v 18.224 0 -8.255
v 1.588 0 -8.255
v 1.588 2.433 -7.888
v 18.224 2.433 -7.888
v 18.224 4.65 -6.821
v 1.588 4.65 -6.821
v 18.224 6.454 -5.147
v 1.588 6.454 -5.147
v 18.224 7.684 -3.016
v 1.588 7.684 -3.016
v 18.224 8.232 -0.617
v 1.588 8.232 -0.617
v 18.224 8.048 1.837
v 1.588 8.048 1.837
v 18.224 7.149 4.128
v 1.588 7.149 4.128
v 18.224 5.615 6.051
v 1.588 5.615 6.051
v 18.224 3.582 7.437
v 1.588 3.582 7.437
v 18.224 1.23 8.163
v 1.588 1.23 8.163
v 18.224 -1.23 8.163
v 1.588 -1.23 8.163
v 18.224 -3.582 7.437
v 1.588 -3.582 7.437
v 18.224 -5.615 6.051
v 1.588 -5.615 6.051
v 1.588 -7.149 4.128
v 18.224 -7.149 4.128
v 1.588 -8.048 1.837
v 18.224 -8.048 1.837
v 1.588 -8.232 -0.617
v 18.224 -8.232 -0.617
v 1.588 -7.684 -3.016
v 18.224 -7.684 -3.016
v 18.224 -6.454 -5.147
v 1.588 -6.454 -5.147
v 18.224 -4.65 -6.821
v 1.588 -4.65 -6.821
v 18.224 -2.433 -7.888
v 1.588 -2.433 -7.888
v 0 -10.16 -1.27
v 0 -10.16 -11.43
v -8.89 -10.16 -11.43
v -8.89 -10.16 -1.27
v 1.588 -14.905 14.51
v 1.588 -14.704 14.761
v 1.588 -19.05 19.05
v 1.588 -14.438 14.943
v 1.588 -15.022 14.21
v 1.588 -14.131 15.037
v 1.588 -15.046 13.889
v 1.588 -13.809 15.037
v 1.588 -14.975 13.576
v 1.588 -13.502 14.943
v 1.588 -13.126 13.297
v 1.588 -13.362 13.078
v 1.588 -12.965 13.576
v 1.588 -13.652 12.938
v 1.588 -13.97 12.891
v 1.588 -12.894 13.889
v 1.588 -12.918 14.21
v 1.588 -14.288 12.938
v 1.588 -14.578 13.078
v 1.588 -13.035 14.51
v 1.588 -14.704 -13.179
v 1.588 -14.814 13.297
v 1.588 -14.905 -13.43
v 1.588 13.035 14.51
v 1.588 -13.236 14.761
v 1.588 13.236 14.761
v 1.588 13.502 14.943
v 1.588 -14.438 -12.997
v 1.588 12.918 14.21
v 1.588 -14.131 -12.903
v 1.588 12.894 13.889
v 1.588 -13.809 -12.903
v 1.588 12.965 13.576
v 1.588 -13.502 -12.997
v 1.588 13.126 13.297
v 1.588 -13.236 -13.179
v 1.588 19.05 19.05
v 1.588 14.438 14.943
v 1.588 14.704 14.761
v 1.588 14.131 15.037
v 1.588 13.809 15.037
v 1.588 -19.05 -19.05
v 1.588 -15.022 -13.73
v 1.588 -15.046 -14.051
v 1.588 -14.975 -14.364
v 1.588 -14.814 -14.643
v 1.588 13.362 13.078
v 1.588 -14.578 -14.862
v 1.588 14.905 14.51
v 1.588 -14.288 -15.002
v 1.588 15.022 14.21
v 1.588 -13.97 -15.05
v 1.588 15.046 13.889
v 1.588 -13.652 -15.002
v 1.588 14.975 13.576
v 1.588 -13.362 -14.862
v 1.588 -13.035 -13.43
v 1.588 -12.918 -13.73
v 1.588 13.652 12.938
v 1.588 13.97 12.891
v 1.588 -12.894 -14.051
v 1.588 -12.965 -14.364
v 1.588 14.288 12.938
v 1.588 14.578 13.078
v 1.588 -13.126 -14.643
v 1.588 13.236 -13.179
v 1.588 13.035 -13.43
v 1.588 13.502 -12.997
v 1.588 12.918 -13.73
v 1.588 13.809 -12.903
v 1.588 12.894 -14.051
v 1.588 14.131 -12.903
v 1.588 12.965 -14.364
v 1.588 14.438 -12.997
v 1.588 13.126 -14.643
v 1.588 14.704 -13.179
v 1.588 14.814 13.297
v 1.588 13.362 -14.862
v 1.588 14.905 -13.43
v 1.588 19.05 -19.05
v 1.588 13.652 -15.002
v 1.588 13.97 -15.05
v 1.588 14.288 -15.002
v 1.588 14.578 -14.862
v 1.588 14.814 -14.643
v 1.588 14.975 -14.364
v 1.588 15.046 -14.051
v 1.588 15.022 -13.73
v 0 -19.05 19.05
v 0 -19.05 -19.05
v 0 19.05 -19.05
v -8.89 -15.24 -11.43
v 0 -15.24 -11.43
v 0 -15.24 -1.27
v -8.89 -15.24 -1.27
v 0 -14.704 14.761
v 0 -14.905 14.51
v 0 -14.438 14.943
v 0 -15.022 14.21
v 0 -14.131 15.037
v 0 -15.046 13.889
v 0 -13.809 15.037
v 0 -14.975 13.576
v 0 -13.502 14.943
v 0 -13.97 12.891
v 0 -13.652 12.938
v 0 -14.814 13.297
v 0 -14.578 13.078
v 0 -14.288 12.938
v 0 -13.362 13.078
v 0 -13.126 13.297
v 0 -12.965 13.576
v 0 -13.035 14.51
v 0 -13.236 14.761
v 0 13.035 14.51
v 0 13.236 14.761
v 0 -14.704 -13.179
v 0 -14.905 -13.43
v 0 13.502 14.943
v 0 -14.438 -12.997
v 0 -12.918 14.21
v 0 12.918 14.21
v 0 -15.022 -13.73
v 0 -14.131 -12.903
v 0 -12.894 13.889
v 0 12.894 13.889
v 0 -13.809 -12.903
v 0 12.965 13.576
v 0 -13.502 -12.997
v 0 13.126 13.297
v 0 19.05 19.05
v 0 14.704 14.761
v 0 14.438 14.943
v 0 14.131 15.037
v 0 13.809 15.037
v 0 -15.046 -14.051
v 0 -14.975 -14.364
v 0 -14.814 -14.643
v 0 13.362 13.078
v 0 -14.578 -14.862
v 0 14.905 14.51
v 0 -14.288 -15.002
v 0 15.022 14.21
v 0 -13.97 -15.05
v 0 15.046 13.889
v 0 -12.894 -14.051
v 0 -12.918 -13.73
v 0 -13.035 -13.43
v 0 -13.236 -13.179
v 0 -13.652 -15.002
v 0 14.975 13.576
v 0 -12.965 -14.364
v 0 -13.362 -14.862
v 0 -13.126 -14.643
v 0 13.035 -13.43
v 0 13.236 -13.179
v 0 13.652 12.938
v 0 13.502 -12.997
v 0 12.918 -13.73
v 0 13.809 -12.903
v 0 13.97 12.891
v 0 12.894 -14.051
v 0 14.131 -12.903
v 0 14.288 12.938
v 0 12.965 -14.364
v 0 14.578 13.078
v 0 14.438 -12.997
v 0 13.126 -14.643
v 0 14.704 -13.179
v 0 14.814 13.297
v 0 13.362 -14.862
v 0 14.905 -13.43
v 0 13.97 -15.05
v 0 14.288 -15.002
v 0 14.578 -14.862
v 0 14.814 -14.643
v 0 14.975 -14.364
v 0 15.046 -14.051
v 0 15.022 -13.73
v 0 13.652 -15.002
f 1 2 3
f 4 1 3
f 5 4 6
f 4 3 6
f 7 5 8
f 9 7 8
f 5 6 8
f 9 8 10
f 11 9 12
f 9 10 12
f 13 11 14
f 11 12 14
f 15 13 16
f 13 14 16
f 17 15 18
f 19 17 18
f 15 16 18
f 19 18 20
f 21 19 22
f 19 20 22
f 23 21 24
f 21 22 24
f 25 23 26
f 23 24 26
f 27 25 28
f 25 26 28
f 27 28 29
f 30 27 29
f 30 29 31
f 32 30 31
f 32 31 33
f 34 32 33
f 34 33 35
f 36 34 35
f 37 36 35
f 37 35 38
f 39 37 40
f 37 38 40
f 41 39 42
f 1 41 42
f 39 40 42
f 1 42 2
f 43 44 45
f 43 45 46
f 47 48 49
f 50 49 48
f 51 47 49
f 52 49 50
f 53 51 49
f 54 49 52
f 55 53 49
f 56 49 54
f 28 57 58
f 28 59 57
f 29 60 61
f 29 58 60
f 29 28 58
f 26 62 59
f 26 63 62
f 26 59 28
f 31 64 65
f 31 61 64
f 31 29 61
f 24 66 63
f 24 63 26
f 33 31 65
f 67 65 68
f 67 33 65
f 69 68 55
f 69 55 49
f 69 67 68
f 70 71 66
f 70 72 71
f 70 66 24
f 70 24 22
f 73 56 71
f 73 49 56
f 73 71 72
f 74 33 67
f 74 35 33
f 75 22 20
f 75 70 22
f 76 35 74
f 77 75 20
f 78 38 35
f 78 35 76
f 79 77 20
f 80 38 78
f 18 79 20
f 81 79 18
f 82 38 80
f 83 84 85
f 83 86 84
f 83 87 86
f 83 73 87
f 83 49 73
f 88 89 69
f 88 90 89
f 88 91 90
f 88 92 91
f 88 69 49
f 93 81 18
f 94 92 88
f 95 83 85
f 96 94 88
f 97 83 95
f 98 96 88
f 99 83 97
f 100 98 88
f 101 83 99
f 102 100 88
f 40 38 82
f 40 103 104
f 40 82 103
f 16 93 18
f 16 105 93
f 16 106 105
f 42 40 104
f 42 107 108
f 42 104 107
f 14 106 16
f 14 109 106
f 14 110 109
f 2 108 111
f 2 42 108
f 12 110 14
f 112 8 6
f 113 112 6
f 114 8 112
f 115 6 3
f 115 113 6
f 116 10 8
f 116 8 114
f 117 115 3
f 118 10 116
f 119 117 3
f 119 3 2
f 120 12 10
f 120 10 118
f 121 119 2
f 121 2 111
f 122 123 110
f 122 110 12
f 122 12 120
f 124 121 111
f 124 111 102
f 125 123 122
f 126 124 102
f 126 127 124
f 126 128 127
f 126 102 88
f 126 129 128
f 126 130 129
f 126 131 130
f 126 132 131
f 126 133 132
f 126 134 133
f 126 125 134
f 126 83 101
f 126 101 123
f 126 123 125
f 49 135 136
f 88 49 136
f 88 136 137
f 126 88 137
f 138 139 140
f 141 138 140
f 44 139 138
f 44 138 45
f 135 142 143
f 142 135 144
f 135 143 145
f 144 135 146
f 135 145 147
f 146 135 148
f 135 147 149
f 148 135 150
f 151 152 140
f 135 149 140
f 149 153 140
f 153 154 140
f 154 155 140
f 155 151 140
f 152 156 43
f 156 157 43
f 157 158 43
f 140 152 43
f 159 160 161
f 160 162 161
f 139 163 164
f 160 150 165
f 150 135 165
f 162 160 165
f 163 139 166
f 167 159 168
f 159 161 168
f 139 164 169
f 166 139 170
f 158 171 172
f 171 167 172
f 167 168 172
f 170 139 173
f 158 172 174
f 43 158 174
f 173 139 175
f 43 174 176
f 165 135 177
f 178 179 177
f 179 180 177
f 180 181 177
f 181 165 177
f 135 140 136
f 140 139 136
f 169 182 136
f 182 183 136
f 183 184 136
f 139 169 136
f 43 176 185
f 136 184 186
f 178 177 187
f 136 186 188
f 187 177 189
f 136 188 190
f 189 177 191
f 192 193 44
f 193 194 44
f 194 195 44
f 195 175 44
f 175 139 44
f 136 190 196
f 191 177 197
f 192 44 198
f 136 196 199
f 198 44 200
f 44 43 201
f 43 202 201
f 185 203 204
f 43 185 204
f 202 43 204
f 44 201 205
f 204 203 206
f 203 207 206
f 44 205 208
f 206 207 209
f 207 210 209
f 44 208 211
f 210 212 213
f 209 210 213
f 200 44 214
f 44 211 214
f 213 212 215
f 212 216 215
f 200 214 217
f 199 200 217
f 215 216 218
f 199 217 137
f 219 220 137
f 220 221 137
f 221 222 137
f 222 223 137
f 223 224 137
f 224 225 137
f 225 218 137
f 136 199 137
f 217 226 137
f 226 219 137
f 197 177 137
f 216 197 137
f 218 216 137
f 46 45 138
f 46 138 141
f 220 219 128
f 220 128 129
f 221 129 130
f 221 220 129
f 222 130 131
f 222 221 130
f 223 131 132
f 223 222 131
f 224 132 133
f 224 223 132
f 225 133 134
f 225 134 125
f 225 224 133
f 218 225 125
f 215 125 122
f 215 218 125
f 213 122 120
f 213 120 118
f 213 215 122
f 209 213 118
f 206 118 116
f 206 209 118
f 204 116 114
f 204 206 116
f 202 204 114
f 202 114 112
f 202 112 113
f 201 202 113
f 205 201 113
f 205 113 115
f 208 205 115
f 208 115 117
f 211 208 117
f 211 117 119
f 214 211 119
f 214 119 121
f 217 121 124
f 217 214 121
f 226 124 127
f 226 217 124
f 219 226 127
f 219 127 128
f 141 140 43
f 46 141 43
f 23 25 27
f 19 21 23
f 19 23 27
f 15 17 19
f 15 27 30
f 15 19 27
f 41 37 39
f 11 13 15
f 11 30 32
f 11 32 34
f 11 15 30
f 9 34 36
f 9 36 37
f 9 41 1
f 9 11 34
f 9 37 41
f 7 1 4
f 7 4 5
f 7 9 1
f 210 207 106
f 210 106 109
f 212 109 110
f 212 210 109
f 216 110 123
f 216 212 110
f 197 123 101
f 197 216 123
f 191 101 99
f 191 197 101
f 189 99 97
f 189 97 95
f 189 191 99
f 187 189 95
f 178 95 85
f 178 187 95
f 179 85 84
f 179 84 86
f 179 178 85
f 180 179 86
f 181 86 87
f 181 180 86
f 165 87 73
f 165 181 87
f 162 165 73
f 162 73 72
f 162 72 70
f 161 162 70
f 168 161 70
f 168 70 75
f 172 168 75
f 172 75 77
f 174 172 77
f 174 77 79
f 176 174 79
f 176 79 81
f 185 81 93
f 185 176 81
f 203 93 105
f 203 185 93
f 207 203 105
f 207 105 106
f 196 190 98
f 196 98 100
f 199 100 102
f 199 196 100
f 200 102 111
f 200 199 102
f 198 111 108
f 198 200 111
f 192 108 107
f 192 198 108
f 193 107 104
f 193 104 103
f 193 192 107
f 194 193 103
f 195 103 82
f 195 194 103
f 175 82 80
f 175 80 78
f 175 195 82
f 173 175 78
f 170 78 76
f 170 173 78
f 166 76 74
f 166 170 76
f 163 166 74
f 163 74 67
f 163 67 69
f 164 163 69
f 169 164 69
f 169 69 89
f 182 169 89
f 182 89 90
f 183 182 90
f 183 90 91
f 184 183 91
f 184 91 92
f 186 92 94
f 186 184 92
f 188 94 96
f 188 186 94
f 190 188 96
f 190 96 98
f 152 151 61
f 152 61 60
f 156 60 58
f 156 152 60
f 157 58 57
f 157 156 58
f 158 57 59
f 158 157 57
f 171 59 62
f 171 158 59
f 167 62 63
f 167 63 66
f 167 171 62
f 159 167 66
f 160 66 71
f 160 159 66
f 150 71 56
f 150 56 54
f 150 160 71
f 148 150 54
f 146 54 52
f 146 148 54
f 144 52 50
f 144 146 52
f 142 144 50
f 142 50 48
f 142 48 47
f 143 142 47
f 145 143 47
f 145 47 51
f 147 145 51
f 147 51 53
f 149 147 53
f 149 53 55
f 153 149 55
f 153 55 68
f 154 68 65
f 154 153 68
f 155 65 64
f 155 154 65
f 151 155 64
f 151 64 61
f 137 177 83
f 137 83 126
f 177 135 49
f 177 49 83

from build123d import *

# Parameters (mm, degrees)
SKETCH1_W           = 38.1
SKETCH1_H           = 38.1
SKETCH1_R           = 1.0795
BOSS_EXTRUDE1_DEPTH = 1.5875
SKETCH3_W           = 10.16
SKETCH3_H           = 5.08
BOSS_EXTRUDE2_DEPTH = 8.89
SKETCH4_R           = 8.255
BOSS_EXTRUDE3_DEPTH = 16.637


with BuildPart() as part:
    # Sketch1 → Boss-Extrude1 (new body)
    with BuildSketch(Plane(origin=(0, 0, 0), x_dir=(0, 0, -1), z_dir=(1, 0, 0))):
        Rectangle(SKETCH1_W, SKETCH1_H)
        with Locations((13.97, -13.97)):
            Circle(SKETCH1_R, mode=Mode.SUBTRACT)
        with Locations((-13.97, -13.97)):
            Circle(SKETCH1_R, mode=Mode.SUBTRACT)
        with Locations((-13.97, 13.97)):
            Circle(SKETCH1_R, mode=Mode.SUBTRACT)
        with Locations((13.97, 13.97)):
            Circle(SKETCH1_R, mode=Mode.SUBTRACT)
    extrude(amount=BOSS_EXTRUDE1_DEPTH)

    # Sketch3 → Boss-Extrude2 (add)
    with BuildSketch(Plane.ZY):
        with Locations((-6.35, -12.7)):
            Rectangle(SKETCH3_W, SKETCH3_H)
    extrude(amount=BOSS_EXTRUDE2_DEPTH)

    # Sketch4 → Boss-Extrude3 (add)
    with BuildSketch(Plane(origin=(1.5875, 0, 0), x_dir=(0, 0, -1), z_dir=(1, 0, 0))):
        Circle(SKETCH4_R)
    extrude(amount=BOSS_EXTRUDE3_DEPTH)


solid = part.part
